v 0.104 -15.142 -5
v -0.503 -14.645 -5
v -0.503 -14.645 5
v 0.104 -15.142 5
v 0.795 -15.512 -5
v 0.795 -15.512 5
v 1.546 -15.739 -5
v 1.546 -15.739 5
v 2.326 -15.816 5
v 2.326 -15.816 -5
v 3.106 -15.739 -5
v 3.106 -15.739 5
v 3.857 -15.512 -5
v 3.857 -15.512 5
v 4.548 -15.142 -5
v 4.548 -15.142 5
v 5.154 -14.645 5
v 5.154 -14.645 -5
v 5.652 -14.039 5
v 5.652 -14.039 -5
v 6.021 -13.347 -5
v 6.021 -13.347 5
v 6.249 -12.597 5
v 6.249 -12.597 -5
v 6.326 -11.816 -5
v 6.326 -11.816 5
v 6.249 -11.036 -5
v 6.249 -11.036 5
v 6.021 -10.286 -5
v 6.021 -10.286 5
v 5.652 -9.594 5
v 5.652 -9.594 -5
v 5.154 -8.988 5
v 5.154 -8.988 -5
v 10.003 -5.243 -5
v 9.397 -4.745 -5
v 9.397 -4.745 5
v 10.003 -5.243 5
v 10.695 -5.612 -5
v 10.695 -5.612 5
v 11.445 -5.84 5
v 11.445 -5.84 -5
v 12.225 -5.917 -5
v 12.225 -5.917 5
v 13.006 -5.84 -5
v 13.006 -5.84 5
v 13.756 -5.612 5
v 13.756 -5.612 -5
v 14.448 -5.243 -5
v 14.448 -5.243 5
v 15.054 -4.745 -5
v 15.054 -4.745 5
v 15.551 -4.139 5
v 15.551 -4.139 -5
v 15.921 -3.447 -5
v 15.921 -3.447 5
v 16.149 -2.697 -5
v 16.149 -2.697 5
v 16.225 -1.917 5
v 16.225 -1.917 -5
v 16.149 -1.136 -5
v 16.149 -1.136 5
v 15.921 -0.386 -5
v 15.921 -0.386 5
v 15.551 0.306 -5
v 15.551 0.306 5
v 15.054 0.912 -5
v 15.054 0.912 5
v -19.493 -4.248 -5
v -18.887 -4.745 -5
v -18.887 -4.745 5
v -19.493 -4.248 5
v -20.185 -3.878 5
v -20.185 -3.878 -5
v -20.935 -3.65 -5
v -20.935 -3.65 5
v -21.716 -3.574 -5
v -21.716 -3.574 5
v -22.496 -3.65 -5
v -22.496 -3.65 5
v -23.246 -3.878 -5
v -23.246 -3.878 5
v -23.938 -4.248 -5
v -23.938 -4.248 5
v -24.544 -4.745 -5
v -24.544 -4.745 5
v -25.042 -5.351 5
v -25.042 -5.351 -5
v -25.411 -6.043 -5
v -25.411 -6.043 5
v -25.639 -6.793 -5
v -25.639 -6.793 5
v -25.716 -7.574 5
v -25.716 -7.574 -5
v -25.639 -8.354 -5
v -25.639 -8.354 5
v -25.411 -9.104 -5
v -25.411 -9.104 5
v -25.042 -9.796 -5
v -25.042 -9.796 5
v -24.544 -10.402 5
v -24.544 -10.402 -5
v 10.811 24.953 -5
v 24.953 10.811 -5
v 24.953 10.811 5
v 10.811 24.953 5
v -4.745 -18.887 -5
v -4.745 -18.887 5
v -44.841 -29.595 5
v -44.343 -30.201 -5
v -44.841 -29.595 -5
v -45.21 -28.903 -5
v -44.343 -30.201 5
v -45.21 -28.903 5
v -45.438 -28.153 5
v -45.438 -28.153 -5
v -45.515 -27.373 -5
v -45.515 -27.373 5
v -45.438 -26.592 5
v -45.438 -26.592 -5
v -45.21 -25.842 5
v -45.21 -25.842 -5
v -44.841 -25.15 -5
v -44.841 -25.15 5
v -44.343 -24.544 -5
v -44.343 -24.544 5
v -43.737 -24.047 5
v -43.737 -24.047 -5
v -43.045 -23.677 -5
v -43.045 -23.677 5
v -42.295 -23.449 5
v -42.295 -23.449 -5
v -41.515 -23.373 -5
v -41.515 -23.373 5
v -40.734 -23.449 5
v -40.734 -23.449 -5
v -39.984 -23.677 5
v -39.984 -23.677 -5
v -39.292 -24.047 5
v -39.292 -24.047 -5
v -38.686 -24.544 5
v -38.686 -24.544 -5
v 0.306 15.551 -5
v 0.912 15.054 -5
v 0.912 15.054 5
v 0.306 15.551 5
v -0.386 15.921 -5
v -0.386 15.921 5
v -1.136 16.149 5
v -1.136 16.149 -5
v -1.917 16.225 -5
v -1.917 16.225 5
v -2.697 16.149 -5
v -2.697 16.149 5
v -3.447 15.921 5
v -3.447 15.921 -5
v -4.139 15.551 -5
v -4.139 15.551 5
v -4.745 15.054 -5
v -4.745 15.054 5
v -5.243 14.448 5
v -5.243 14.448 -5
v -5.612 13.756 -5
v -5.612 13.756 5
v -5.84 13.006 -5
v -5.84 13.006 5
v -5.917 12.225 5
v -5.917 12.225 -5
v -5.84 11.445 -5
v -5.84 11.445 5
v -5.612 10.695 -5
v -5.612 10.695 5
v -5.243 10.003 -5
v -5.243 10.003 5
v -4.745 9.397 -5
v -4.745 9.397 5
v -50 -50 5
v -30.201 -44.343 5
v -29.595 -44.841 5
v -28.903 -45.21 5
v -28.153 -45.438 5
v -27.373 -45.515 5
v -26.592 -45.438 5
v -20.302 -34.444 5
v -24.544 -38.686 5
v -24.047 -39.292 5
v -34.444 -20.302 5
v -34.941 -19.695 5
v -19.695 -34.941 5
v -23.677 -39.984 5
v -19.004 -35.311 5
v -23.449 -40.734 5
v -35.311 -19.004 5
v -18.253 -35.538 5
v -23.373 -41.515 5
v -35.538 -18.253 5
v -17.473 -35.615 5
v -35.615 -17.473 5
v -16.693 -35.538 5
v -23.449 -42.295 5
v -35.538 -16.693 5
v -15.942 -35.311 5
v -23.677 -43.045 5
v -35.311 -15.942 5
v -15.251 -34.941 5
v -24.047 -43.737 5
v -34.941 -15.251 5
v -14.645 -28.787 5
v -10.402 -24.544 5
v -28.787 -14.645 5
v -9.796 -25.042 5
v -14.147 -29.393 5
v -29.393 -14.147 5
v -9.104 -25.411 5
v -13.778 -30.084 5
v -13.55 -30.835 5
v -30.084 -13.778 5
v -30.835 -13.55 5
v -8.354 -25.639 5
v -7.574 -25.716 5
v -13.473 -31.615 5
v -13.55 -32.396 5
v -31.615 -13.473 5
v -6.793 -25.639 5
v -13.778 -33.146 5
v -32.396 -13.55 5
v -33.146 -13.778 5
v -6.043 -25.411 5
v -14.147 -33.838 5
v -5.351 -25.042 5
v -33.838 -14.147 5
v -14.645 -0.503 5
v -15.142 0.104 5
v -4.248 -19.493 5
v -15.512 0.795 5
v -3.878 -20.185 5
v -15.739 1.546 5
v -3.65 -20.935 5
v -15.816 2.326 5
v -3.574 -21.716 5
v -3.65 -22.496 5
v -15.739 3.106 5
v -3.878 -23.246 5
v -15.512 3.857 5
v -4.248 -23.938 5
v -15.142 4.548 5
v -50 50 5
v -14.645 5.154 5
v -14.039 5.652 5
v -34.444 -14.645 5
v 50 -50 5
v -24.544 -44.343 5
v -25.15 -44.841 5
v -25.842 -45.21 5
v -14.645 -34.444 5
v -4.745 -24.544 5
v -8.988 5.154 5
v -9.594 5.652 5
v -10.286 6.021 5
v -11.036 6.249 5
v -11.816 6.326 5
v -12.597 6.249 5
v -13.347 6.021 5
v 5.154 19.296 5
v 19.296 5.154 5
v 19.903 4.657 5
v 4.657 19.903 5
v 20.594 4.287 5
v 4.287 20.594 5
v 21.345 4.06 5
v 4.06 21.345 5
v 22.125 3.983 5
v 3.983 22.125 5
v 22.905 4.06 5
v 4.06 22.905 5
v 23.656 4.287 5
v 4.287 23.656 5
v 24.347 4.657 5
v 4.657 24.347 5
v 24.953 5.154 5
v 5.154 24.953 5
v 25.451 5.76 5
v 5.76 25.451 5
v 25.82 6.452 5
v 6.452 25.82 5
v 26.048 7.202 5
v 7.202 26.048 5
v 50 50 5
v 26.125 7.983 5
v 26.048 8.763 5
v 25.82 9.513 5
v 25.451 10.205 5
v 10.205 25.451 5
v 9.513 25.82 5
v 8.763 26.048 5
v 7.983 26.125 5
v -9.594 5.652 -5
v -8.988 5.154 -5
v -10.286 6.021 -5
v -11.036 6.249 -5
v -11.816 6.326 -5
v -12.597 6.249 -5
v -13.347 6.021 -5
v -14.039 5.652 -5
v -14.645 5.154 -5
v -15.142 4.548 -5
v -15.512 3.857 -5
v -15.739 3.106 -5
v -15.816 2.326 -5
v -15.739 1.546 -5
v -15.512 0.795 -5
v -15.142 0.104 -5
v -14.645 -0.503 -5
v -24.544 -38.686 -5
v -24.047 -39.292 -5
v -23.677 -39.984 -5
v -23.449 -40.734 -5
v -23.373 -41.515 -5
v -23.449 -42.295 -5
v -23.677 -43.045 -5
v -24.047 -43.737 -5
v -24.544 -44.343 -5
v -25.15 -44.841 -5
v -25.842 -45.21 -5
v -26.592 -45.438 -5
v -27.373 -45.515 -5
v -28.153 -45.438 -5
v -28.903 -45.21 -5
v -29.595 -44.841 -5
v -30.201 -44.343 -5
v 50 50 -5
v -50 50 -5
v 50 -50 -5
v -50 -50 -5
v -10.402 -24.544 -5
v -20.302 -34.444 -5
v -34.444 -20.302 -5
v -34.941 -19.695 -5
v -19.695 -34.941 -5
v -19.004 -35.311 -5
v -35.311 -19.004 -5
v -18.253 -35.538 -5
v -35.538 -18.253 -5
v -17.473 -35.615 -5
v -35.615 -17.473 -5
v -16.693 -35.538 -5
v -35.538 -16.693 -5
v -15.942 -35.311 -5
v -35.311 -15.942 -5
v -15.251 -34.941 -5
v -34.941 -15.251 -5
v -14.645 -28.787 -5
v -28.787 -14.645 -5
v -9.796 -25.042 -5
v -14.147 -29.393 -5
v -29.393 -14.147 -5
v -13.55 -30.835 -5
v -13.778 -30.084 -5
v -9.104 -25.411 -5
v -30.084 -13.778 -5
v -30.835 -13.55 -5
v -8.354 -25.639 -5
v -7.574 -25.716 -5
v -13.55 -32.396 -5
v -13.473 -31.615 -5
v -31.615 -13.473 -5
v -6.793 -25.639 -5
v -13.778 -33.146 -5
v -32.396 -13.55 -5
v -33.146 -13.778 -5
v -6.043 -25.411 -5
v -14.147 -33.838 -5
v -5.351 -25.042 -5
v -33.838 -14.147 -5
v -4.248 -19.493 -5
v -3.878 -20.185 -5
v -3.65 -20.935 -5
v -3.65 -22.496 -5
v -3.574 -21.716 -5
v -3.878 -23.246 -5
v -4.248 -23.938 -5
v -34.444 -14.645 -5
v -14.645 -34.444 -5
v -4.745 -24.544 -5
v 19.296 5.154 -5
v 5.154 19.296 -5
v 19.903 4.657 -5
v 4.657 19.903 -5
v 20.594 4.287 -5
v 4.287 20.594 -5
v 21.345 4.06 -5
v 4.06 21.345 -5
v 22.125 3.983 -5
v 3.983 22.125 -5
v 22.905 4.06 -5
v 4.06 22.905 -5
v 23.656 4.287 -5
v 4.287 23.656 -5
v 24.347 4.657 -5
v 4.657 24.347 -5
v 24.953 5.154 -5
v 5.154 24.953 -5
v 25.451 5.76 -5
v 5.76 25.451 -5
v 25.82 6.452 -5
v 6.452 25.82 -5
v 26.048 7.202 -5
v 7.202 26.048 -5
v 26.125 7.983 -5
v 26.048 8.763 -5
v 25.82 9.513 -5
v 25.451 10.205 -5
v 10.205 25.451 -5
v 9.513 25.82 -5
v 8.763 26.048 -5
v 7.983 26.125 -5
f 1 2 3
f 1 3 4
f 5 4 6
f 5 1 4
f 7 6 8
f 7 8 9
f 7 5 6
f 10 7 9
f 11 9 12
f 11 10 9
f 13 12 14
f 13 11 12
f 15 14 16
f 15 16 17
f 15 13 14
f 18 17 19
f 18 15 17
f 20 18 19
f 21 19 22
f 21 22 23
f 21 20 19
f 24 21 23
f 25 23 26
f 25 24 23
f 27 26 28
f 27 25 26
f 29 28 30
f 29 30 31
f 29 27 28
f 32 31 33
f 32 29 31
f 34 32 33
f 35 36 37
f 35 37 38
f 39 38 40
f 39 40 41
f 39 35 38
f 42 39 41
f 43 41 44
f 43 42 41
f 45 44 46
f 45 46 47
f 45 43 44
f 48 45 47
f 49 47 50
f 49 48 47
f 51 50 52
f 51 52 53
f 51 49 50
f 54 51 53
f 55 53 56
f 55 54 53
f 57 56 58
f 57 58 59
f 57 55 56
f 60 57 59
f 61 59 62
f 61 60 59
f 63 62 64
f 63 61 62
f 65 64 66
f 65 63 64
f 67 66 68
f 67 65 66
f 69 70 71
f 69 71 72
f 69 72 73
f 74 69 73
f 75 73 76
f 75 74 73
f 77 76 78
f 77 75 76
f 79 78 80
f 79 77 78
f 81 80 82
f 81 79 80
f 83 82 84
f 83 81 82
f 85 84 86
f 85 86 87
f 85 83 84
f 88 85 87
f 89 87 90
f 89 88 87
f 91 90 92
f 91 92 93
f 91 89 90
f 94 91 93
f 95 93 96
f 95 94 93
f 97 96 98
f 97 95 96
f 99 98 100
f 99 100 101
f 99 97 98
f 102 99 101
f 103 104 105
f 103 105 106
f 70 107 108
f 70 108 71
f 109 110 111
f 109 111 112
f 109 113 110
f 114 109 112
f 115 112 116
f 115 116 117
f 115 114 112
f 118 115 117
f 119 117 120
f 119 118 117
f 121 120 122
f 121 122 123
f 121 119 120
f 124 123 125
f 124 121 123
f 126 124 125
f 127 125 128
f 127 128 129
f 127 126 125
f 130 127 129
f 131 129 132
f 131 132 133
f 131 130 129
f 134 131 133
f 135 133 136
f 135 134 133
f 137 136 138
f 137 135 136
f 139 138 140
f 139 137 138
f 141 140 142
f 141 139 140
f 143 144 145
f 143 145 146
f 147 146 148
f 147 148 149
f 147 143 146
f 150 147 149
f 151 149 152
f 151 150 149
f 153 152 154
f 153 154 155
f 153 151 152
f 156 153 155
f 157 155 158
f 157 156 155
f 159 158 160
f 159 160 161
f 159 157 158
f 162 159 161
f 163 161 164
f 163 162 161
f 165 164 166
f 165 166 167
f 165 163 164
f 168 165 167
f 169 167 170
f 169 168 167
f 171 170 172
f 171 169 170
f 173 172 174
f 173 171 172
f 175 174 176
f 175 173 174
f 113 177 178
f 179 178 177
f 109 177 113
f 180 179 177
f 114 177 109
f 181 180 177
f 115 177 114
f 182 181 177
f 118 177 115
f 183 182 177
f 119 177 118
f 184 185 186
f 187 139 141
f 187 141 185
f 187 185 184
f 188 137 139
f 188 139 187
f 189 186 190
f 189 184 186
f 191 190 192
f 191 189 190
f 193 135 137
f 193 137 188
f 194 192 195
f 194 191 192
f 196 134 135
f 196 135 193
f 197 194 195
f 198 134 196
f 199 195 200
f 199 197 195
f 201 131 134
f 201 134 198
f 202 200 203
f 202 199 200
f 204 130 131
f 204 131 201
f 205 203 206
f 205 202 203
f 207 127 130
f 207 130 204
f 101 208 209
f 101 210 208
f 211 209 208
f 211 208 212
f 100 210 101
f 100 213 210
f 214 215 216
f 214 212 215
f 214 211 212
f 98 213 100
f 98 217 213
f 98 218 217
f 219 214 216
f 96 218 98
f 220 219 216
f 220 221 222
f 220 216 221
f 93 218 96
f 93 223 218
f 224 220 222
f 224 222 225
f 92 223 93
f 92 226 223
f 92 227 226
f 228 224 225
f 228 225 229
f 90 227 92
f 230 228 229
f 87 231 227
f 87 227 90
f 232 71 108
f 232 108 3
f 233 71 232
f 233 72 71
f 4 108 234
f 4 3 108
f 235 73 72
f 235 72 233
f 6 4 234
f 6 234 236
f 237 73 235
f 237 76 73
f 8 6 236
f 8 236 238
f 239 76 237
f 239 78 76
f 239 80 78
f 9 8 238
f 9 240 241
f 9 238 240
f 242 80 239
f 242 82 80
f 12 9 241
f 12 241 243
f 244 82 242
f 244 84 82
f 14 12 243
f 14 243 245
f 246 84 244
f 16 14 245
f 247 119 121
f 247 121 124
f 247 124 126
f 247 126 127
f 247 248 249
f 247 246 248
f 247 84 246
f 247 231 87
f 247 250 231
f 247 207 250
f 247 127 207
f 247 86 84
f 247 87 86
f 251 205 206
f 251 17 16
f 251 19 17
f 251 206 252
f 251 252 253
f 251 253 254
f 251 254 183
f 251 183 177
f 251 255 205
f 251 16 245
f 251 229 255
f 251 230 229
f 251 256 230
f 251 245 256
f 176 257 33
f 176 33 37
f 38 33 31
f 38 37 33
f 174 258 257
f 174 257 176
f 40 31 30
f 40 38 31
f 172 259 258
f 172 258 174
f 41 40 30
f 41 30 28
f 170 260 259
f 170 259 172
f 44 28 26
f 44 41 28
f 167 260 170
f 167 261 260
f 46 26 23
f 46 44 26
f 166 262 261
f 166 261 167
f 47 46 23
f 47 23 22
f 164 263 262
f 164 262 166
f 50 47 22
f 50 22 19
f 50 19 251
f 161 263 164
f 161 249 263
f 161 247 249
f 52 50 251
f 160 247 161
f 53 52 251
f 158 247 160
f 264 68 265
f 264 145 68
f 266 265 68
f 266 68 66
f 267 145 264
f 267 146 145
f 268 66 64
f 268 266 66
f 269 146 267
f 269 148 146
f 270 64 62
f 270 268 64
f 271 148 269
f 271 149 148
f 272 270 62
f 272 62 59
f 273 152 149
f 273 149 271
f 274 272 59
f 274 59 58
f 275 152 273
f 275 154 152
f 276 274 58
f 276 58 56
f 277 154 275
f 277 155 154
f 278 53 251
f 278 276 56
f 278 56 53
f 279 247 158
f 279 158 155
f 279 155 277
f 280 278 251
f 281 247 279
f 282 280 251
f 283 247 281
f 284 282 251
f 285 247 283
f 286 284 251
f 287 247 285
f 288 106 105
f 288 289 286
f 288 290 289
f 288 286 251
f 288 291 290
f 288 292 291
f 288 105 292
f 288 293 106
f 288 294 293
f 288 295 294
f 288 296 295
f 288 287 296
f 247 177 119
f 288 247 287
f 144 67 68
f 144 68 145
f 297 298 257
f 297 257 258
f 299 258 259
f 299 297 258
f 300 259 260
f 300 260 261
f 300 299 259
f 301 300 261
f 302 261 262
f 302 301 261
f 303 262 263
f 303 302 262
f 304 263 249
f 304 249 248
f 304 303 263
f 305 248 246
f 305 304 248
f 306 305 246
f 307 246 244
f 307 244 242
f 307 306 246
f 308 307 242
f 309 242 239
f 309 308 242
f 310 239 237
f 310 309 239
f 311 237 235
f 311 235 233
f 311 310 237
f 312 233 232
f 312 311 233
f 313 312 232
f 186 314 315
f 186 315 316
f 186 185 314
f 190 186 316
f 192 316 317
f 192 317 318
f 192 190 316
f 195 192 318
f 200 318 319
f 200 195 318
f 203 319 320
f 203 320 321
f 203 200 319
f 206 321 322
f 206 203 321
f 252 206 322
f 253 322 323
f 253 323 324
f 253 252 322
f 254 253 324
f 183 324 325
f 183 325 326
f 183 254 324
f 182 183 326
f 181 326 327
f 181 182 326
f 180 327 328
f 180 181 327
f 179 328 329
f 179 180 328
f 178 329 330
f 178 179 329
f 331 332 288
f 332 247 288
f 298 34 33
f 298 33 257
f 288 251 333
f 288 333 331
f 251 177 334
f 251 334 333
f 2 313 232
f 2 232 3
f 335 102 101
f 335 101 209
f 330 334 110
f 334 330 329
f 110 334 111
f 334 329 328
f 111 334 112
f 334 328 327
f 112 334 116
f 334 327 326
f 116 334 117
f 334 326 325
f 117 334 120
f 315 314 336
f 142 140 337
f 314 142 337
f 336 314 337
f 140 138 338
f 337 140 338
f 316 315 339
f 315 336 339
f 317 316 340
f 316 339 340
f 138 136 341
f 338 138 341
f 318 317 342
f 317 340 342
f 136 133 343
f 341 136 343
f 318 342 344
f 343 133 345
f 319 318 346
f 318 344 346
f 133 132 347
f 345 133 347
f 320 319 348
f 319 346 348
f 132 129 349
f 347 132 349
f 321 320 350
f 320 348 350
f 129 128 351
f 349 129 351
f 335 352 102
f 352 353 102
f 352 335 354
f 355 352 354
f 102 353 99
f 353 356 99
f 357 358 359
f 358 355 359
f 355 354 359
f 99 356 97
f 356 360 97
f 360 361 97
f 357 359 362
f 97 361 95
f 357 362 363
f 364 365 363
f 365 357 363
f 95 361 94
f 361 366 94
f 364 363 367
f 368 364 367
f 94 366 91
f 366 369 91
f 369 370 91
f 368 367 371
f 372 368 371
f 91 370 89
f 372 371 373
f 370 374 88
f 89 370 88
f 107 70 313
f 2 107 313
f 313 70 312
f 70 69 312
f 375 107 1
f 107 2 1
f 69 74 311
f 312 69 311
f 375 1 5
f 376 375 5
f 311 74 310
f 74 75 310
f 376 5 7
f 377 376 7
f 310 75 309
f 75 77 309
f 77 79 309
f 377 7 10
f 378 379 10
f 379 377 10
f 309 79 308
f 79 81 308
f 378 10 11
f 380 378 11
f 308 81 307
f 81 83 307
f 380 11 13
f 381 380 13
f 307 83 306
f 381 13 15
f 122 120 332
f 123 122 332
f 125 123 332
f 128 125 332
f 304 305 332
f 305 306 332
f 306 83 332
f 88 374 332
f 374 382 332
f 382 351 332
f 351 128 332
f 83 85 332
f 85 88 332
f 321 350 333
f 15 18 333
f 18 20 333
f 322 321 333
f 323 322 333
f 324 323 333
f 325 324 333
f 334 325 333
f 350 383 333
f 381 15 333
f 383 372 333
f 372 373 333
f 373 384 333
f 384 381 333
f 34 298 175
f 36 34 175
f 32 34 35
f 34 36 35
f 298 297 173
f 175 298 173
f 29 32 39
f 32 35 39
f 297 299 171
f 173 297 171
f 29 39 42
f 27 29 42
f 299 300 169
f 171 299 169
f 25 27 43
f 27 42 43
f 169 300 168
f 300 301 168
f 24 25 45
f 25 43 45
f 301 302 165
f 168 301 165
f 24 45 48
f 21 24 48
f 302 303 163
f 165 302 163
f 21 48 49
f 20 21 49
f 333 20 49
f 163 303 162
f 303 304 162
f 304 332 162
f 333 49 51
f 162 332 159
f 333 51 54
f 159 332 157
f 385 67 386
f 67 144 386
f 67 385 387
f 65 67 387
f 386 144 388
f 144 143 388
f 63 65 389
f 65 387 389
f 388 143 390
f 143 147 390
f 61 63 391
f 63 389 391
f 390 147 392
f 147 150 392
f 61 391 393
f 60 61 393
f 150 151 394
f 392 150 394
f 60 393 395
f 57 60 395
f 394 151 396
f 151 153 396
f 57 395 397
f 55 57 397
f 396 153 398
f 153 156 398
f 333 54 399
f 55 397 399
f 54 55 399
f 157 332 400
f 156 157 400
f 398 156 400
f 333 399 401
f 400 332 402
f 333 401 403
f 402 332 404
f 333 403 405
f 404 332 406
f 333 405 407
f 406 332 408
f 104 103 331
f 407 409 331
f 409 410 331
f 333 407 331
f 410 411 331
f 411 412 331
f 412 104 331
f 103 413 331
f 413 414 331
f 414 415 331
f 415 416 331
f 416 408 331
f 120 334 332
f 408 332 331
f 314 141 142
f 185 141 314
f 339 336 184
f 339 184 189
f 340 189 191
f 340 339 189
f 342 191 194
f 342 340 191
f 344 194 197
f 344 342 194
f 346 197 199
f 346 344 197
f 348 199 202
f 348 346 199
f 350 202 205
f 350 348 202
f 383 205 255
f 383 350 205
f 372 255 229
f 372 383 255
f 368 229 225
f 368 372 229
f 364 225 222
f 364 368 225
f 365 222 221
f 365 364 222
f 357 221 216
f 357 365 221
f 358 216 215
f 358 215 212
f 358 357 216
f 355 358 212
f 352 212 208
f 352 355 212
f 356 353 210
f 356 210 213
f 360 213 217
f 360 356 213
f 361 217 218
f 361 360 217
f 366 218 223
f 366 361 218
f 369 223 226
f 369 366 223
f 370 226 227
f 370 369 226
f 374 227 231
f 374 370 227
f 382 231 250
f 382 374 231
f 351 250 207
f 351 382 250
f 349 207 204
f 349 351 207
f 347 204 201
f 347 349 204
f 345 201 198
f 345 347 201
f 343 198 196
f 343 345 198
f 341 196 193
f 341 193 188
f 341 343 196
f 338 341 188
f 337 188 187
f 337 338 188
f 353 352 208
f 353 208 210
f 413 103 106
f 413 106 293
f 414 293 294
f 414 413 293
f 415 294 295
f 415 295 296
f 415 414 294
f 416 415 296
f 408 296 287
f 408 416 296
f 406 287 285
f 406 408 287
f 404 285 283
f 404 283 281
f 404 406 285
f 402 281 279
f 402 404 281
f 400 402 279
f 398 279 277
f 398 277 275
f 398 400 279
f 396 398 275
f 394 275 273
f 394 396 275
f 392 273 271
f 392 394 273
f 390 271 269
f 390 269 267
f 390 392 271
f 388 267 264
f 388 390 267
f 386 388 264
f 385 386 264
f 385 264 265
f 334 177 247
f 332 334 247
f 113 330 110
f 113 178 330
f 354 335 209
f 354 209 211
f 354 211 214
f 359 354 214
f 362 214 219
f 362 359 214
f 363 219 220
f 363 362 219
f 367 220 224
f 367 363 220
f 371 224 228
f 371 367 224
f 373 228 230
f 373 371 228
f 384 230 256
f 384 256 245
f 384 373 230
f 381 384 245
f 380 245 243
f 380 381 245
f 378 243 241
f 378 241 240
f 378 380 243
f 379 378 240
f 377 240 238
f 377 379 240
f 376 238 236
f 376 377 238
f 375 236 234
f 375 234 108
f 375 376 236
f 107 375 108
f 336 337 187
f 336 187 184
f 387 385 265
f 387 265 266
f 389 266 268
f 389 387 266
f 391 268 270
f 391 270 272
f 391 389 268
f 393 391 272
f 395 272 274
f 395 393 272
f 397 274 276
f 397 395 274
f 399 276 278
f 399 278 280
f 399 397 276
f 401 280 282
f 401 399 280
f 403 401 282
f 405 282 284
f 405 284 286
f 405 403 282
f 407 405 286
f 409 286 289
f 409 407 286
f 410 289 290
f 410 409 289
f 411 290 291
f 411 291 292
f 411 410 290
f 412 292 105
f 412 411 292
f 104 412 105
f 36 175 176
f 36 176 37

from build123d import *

# Parameters (mm, degrees)
SKETCH1_W           = 100
SKETCH1_H           = 100
BOSS_EXTRUDE1_DEPTH = 5
LPATTERN2_START     = -5
LPATTERN2_DEPTH     = 10


# Read off the part's stored shape, not the designer's step: LPattern2
with BuildPart() as part:
    # Sketch1 → Boss-Extrude1 (new, symmetric)
    with BuildSketch(Plane.XY):
        Rectangle(SKETCH1_W, SKETCH1_H)
        with BuildLine():
            Line((-38.686291501, -24.544155877), (-24.544155877, -38.686291501))
            ThreePointArc((-24.544155877, -38.686291501), (-24.544155877, -44.343145751), (-30.201010127, -44.343145751))
            Line((-30.201010127, -44.343145751), (-44.343145751, -30.201010127))
            ThreePointArc((-44.343145751, -30.201010127), (-44.343145751, -24.544155877), (-38.686291501, -24.544155877))
        make_face(mode=Mode.SUBTRACT)
    extrude(amount=BOSS_EXTRUDE1_DEPTH, both=True)

    # LPattern2 outline → LPattern2 (cut)
    with BuildSketch(Plane.XY.offset(LPATTERN2_START)):
        with BuildLine():
            Line((24.953318806, 10.811183182), (10.811183182, 24.953318806))
            ThreePointArc((10.811183182, 24.953318806), (5.154328933, 24.953318806), (5.154328933, 19.296464556))
            Line((5.154328933, 19.296464556), (19.296464556, 5.154328933))
            ThreePointArc((19.296464556, 5.154328933), (24.953318806, 5.154328933), (24.953318806, 10.811183182))
        make_face()
        with BuildLine():
            Line((15.053823869, 0.911688245), (0.911688245, 15.053823869))
            ThreePointArc((0.911688245, 15.053823869), (-4.745166004, 15.053823869), (-4.745166004, 9.39696962))
            Line((-4.745166004, 9.39696962), (9.39696962, -4.745166004))
            ThreePointArc((9.39696962, -4.745166004), (15.053823869, -4.745166004), (15.053823869, 0.911688245))
        make_face()
        with BuildLine():
            Line((5.154328933, -8.987806691), (-8.987806691, 5.154328933))
            ThreePointArc((-8.987806691, 5.154328933), (-14.644660941, 5.154328933), (-14.644660941, -0.502525317))
            Line((-14.644660941, -0.502525317), (-0.502525317, -14.644660941))
            ThreePointArc((-0.502525317, -14.644660941), (5.154328933, -14.644660941), (5.154328933, -8.987806691))
        make_face()
        with BuildLine():
            Line((-4.745166004, -18.887301628), (-18.887301628, -4.745166004))
            ThreePointArc((-18.887301628, -4.745166004), (-24.544155877, -4.745166004), (-24.544155877, -10.402020254))
            Line((-24.544155877, -10.402020254), (-10.402020254, -24.544155877))
            ThreePointArc((-10.402020254, -24.544155877), (-4.745166004, -24.544155877), (-4.745166004, -18.887301628))
        make_face()
        with BuildLine():
            Line((-14.644660941, -28.786796564), (-28.786796564, -14.644660941))
            ThreePointArc((-28.786796564, -14.644660941), (-34.443650813, -14.64466094), (-34.443650814, -20.30151519))
            Line((-34.443650814, -20.30151519), (-20.30151519, -34.443650814))
            ThreePointArc((-20.30151519, -34.443650814), (-14.64466094, -34.443650813), (-14.644660941, -28.786796564))
        make_face()
    extrude(amount=LPATTERN2_DEPTH, mode=Mode.SUBTRACT)


solid = part.part
